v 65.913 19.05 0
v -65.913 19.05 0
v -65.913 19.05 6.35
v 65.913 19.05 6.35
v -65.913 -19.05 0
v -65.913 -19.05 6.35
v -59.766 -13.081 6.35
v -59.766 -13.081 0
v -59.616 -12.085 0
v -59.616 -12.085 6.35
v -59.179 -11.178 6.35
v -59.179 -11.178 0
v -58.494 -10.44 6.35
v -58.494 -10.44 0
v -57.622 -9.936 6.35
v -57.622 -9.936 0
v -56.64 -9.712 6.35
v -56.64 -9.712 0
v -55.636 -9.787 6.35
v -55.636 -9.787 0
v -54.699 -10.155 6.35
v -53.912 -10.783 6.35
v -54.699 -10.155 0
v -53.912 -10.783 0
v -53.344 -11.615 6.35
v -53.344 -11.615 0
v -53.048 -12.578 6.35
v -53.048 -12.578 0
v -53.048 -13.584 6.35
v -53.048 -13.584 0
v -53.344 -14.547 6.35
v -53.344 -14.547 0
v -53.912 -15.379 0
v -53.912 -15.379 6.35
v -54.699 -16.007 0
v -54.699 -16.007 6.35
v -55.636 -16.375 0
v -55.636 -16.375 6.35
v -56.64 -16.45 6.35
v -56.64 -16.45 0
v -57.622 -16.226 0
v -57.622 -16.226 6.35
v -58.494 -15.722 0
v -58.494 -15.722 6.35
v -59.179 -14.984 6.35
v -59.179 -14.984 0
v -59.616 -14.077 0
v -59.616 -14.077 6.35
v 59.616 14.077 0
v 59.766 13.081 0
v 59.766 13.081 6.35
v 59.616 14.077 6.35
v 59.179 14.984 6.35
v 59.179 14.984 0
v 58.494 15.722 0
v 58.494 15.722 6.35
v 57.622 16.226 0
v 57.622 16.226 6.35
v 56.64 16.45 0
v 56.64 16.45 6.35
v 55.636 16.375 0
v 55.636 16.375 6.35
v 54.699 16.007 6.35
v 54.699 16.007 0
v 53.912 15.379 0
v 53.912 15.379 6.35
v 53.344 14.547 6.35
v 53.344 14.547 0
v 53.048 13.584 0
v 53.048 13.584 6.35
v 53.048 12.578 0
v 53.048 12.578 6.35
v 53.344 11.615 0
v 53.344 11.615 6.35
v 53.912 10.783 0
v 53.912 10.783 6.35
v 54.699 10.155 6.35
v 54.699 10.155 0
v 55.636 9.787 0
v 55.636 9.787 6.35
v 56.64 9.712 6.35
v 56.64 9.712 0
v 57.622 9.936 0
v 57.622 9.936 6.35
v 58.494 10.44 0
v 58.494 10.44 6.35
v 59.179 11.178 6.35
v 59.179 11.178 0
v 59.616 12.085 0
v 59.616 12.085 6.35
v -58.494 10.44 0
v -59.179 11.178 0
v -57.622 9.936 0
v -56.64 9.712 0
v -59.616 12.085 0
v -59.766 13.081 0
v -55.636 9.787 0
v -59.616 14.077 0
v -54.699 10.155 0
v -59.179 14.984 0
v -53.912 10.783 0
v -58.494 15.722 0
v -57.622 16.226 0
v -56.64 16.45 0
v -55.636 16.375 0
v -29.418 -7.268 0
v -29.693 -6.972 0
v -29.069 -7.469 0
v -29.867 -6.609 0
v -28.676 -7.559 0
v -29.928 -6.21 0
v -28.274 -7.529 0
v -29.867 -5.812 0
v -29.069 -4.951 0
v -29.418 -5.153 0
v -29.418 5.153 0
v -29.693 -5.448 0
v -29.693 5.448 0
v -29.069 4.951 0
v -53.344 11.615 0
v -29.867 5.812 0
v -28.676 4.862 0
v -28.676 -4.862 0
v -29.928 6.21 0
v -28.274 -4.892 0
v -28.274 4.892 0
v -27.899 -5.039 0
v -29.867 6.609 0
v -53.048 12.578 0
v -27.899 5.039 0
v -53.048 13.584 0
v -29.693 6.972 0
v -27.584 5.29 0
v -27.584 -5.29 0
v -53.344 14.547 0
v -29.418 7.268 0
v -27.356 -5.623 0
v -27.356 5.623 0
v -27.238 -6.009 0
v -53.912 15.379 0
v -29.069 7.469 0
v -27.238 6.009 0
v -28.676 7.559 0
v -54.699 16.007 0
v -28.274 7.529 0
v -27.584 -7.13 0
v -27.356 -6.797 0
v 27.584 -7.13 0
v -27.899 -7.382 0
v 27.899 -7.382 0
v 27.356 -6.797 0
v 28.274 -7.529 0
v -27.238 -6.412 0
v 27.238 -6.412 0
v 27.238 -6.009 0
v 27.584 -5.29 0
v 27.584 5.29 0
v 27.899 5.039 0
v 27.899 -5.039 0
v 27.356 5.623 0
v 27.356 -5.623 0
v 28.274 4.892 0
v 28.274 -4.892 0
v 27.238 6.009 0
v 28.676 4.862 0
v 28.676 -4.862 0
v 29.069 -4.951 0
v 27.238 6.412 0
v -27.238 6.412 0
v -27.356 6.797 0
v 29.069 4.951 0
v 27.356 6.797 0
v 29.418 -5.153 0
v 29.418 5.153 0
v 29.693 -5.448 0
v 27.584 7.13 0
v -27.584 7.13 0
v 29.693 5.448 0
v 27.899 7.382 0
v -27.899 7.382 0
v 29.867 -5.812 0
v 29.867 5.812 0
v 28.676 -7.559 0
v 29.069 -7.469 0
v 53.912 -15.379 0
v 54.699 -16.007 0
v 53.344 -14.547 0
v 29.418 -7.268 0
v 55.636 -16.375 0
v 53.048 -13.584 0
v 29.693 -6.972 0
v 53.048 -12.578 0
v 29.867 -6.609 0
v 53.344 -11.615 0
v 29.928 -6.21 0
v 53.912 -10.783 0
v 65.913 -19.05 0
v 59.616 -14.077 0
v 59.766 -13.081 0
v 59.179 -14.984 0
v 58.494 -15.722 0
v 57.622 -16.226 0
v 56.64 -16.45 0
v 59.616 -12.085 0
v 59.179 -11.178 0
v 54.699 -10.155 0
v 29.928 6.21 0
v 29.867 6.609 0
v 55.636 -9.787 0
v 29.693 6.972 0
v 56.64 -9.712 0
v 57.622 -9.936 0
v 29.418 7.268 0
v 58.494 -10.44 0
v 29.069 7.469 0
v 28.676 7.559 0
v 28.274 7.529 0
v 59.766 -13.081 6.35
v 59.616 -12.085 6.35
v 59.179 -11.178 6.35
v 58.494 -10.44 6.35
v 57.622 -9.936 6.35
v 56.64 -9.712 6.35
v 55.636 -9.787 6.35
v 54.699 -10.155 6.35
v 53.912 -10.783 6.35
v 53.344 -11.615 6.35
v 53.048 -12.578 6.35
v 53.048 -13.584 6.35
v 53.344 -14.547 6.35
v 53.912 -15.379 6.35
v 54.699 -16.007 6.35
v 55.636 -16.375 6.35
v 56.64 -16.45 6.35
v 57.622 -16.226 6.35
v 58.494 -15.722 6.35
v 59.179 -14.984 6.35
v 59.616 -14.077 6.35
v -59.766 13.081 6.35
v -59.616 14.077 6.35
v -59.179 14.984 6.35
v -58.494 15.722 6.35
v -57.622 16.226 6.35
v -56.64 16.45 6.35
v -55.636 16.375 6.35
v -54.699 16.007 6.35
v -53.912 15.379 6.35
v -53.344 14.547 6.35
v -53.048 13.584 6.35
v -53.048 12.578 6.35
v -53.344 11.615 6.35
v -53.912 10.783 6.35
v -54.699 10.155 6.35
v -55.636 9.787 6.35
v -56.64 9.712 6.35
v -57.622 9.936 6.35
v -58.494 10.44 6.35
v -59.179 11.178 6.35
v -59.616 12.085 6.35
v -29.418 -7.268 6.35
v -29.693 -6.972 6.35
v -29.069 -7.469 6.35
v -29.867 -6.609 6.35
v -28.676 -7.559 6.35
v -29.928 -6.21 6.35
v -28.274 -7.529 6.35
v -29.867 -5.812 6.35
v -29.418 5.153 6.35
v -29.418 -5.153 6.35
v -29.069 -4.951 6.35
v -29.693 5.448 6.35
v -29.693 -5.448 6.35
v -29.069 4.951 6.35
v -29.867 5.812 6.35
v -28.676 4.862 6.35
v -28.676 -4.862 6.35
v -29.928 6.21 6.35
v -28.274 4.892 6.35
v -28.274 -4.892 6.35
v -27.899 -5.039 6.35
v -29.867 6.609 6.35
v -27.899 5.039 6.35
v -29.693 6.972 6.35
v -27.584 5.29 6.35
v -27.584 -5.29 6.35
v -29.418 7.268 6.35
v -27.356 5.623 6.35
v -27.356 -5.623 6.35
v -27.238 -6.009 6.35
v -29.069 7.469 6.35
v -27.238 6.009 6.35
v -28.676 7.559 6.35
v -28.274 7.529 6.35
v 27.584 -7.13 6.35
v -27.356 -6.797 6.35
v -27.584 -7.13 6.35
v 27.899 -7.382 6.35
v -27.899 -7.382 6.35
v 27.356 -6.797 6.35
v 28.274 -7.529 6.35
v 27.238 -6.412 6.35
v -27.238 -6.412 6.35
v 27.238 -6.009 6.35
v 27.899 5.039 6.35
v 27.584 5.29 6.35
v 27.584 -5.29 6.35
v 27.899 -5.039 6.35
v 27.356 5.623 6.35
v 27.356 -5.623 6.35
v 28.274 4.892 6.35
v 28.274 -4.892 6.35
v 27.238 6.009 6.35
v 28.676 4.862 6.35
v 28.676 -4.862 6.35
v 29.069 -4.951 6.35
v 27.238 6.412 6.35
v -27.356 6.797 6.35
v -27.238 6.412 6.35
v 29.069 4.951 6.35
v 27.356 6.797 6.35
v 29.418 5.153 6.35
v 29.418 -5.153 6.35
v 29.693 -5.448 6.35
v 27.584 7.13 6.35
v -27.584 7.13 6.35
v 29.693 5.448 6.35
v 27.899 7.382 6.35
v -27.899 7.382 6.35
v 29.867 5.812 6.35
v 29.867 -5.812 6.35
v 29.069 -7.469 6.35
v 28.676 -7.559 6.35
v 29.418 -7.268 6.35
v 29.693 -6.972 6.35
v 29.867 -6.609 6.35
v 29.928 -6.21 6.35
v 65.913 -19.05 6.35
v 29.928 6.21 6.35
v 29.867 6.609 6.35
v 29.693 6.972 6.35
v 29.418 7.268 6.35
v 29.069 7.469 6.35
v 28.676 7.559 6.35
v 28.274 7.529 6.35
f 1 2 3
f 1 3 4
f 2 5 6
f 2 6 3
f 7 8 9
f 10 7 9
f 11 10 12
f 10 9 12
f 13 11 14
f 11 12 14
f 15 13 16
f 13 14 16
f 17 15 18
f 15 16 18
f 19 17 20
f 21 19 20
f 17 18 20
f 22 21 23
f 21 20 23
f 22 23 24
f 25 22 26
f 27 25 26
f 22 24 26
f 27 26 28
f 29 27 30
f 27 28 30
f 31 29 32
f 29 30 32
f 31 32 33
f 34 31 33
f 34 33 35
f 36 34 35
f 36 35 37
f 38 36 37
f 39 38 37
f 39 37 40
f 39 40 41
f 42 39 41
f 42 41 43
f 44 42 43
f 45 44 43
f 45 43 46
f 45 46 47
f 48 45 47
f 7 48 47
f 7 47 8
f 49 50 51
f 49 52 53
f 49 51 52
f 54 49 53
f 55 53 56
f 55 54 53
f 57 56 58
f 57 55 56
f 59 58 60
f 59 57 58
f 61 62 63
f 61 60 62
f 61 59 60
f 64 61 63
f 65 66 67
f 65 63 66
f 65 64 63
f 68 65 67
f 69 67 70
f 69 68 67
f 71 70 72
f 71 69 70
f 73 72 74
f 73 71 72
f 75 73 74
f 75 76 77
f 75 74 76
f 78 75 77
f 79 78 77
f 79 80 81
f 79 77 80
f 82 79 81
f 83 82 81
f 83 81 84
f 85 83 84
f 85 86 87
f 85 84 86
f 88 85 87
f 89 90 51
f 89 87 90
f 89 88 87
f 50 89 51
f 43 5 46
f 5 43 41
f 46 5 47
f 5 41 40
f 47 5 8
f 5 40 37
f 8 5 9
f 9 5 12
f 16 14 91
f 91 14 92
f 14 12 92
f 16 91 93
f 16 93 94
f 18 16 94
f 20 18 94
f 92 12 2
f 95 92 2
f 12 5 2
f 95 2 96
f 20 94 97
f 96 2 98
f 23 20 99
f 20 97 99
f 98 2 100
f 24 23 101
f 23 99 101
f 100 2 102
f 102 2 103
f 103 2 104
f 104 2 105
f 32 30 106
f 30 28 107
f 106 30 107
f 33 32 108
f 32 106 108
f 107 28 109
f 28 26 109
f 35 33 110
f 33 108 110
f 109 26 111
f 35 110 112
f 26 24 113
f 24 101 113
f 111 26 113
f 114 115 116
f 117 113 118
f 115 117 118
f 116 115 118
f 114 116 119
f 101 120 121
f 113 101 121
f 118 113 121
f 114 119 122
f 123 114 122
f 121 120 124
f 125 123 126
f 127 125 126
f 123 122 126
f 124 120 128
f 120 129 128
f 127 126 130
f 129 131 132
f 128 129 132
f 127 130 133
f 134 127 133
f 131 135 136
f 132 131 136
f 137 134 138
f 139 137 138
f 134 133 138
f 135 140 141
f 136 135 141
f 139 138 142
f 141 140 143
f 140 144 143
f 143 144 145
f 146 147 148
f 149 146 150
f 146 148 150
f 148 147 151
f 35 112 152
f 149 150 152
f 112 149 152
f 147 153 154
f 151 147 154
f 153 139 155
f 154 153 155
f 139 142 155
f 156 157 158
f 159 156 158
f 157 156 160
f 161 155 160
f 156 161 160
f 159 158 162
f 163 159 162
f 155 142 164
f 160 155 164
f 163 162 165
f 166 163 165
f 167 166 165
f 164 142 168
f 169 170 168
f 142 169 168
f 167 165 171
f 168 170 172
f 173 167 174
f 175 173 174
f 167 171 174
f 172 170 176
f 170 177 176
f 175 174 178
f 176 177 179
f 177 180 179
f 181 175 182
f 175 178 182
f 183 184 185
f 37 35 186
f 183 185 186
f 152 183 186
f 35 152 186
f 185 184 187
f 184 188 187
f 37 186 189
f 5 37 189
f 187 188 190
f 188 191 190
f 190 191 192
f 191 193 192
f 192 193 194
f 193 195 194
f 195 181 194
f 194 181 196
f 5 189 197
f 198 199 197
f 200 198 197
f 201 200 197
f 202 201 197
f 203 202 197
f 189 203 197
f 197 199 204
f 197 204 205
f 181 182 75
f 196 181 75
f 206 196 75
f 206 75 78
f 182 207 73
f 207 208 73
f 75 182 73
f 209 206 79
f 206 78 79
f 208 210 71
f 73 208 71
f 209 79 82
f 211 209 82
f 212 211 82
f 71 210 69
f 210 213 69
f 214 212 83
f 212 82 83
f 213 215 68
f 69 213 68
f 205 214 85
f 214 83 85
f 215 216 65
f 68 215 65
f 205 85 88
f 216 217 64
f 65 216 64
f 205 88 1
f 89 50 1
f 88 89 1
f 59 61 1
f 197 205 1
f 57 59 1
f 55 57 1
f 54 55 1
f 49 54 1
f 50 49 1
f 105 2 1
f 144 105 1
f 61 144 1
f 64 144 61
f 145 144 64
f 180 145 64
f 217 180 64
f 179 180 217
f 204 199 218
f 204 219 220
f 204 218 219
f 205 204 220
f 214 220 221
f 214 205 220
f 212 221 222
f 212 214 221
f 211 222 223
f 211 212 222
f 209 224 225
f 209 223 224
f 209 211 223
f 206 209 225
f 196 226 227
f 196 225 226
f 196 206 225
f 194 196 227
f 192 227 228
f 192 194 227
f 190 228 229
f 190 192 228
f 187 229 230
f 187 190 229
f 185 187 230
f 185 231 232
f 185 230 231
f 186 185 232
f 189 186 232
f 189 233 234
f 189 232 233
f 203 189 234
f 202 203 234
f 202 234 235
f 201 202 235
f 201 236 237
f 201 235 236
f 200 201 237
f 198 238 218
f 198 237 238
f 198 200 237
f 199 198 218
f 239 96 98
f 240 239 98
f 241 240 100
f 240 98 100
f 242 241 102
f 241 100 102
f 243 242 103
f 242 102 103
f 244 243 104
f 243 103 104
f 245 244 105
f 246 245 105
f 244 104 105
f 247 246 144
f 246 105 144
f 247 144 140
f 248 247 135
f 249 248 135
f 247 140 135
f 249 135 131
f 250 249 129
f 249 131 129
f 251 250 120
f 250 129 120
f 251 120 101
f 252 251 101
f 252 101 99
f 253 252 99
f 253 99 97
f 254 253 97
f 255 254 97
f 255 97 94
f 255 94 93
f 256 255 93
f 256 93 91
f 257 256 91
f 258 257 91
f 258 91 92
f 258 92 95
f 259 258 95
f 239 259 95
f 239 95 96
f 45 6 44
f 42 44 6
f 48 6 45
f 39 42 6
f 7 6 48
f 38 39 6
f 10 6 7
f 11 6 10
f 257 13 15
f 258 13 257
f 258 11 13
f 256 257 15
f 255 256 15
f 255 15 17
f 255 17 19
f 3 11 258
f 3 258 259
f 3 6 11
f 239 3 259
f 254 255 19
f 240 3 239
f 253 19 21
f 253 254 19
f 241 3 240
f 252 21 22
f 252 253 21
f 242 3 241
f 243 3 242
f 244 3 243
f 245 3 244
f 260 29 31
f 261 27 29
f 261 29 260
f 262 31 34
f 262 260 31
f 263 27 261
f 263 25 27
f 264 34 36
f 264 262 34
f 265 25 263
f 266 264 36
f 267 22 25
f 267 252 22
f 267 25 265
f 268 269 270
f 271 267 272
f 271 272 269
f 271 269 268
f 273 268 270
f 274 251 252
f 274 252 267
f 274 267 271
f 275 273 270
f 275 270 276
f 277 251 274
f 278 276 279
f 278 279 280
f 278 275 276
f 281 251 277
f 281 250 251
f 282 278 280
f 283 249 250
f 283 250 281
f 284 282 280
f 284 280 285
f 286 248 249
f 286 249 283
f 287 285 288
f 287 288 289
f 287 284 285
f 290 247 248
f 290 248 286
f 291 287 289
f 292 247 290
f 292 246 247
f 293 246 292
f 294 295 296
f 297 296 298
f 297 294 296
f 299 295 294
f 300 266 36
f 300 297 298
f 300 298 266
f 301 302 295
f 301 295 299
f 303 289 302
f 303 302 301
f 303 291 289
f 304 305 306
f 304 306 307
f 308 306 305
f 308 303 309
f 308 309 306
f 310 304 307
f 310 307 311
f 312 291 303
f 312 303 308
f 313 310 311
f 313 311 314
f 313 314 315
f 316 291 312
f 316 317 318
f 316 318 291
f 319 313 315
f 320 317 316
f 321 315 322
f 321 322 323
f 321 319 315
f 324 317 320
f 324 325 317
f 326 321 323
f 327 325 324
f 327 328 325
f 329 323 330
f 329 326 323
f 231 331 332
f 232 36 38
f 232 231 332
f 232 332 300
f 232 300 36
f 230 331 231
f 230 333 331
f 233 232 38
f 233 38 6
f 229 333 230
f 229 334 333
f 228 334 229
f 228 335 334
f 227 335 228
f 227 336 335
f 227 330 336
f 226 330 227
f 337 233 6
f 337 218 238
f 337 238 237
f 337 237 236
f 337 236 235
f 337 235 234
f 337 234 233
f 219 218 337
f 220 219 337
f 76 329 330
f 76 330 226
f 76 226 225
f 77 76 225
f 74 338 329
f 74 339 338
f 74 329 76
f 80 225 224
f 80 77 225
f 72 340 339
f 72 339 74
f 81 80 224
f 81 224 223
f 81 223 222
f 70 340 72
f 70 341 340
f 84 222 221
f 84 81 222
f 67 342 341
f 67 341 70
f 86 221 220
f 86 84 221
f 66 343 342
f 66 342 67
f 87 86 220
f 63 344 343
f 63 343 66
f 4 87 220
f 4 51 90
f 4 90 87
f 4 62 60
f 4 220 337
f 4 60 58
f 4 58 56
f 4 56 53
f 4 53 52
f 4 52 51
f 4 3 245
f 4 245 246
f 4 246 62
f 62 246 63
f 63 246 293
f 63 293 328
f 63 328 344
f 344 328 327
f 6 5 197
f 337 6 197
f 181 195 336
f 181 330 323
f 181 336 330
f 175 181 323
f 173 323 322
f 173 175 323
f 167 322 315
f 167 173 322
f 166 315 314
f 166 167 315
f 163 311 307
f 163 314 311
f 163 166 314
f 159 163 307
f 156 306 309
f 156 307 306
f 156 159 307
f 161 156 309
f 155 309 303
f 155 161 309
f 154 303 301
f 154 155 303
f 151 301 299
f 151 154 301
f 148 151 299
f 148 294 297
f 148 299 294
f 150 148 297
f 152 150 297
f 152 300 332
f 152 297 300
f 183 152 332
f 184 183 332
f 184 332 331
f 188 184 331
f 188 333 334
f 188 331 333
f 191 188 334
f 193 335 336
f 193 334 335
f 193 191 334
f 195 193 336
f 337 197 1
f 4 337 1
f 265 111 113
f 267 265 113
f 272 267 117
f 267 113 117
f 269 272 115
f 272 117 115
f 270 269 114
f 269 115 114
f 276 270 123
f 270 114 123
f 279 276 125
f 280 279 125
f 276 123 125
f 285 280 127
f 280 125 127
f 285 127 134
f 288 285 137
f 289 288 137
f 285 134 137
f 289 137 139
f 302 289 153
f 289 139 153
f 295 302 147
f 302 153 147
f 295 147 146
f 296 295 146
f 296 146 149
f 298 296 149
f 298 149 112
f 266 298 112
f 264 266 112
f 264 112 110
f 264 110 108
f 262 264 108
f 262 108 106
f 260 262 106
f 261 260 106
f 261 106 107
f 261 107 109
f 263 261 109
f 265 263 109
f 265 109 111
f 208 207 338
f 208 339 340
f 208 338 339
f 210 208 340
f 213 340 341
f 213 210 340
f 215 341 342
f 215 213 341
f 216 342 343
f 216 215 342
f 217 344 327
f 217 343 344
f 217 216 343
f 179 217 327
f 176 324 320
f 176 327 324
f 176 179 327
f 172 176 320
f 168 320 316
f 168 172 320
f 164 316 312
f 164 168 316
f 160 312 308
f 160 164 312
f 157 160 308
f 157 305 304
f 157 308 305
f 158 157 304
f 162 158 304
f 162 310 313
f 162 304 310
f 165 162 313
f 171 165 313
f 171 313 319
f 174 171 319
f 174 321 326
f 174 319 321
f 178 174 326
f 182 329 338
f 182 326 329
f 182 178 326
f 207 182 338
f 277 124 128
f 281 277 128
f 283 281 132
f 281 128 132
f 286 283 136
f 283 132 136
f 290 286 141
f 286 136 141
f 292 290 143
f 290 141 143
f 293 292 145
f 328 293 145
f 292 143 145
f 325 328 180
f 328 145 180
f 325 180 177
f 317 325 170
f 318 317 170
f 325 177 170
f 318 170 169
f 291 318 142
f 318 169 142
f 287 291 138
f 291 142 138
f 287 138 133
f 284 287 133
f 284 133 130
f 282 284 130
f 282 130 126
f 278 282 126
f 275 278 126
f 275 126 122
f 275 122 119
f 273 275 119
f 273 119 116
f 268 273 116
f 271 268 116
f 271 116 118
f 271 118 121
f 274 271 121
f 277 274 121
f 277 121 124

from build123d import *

# Parameters (mm, degrees)
SKETCH1_W               = 131.826
SKETCH1_H               = 38.1
BOSS_EXTRUDE1_DEPTH     = 6.35
F_1_4_CLEARANCE_HOLE1_D = 6.7564
F_6_32_TAPPED_HOLE1_D   = 2.7051


with BuildPart() as part:
    # Sketch1 → Boss-Extrude1 (new body)
    with BuildSketch(Plane.XY):
        Rectangle(SKETCH1_W, SKETCH1_H)
    extrude(amount=BOSS_EXTRUDE1_DEPTH)

    # 1/4 Clearance Hole1 (through all)
    with Locations(Plane.XY.offset(6.35)):
        with Locations((-56.388, 13.081), (-56.388, -13.081)):
            f_1_4_clearance_hole1 = Hole(F_1_4_CLEARANCE_HOLE1_D / 2)

    # #6-32 Tapped Hole1 (through all)
    with Locations(Plane.XY.offset(6.35)):
        with Locations((-28.575, 6.2103), (-28.575, -6.2103)):
            f_6_32_tapped_hole1 = Hole(F_6_32_TAPPED_HOLE1_D / 2)

    # Mirror1: 1/4 Clearance Hole1, #6-32 Tapped Hole1 across plane
    add(f_1_4_clearance_hole1.mirror(Plane(origin=(0, 0, 0), x_dir=(0, 0, 1), z_dir=(1, 0, 0))), mode=Mode.SUBTRACT)
    add(f_6_32_tapped_hole1.mirror(Plane(origin=(0, 0, 0), x_dir=(0, 0, 1), z_dir=(1, 0, 0))), mode=Mode.SUBTRACT)


solid = part.part
